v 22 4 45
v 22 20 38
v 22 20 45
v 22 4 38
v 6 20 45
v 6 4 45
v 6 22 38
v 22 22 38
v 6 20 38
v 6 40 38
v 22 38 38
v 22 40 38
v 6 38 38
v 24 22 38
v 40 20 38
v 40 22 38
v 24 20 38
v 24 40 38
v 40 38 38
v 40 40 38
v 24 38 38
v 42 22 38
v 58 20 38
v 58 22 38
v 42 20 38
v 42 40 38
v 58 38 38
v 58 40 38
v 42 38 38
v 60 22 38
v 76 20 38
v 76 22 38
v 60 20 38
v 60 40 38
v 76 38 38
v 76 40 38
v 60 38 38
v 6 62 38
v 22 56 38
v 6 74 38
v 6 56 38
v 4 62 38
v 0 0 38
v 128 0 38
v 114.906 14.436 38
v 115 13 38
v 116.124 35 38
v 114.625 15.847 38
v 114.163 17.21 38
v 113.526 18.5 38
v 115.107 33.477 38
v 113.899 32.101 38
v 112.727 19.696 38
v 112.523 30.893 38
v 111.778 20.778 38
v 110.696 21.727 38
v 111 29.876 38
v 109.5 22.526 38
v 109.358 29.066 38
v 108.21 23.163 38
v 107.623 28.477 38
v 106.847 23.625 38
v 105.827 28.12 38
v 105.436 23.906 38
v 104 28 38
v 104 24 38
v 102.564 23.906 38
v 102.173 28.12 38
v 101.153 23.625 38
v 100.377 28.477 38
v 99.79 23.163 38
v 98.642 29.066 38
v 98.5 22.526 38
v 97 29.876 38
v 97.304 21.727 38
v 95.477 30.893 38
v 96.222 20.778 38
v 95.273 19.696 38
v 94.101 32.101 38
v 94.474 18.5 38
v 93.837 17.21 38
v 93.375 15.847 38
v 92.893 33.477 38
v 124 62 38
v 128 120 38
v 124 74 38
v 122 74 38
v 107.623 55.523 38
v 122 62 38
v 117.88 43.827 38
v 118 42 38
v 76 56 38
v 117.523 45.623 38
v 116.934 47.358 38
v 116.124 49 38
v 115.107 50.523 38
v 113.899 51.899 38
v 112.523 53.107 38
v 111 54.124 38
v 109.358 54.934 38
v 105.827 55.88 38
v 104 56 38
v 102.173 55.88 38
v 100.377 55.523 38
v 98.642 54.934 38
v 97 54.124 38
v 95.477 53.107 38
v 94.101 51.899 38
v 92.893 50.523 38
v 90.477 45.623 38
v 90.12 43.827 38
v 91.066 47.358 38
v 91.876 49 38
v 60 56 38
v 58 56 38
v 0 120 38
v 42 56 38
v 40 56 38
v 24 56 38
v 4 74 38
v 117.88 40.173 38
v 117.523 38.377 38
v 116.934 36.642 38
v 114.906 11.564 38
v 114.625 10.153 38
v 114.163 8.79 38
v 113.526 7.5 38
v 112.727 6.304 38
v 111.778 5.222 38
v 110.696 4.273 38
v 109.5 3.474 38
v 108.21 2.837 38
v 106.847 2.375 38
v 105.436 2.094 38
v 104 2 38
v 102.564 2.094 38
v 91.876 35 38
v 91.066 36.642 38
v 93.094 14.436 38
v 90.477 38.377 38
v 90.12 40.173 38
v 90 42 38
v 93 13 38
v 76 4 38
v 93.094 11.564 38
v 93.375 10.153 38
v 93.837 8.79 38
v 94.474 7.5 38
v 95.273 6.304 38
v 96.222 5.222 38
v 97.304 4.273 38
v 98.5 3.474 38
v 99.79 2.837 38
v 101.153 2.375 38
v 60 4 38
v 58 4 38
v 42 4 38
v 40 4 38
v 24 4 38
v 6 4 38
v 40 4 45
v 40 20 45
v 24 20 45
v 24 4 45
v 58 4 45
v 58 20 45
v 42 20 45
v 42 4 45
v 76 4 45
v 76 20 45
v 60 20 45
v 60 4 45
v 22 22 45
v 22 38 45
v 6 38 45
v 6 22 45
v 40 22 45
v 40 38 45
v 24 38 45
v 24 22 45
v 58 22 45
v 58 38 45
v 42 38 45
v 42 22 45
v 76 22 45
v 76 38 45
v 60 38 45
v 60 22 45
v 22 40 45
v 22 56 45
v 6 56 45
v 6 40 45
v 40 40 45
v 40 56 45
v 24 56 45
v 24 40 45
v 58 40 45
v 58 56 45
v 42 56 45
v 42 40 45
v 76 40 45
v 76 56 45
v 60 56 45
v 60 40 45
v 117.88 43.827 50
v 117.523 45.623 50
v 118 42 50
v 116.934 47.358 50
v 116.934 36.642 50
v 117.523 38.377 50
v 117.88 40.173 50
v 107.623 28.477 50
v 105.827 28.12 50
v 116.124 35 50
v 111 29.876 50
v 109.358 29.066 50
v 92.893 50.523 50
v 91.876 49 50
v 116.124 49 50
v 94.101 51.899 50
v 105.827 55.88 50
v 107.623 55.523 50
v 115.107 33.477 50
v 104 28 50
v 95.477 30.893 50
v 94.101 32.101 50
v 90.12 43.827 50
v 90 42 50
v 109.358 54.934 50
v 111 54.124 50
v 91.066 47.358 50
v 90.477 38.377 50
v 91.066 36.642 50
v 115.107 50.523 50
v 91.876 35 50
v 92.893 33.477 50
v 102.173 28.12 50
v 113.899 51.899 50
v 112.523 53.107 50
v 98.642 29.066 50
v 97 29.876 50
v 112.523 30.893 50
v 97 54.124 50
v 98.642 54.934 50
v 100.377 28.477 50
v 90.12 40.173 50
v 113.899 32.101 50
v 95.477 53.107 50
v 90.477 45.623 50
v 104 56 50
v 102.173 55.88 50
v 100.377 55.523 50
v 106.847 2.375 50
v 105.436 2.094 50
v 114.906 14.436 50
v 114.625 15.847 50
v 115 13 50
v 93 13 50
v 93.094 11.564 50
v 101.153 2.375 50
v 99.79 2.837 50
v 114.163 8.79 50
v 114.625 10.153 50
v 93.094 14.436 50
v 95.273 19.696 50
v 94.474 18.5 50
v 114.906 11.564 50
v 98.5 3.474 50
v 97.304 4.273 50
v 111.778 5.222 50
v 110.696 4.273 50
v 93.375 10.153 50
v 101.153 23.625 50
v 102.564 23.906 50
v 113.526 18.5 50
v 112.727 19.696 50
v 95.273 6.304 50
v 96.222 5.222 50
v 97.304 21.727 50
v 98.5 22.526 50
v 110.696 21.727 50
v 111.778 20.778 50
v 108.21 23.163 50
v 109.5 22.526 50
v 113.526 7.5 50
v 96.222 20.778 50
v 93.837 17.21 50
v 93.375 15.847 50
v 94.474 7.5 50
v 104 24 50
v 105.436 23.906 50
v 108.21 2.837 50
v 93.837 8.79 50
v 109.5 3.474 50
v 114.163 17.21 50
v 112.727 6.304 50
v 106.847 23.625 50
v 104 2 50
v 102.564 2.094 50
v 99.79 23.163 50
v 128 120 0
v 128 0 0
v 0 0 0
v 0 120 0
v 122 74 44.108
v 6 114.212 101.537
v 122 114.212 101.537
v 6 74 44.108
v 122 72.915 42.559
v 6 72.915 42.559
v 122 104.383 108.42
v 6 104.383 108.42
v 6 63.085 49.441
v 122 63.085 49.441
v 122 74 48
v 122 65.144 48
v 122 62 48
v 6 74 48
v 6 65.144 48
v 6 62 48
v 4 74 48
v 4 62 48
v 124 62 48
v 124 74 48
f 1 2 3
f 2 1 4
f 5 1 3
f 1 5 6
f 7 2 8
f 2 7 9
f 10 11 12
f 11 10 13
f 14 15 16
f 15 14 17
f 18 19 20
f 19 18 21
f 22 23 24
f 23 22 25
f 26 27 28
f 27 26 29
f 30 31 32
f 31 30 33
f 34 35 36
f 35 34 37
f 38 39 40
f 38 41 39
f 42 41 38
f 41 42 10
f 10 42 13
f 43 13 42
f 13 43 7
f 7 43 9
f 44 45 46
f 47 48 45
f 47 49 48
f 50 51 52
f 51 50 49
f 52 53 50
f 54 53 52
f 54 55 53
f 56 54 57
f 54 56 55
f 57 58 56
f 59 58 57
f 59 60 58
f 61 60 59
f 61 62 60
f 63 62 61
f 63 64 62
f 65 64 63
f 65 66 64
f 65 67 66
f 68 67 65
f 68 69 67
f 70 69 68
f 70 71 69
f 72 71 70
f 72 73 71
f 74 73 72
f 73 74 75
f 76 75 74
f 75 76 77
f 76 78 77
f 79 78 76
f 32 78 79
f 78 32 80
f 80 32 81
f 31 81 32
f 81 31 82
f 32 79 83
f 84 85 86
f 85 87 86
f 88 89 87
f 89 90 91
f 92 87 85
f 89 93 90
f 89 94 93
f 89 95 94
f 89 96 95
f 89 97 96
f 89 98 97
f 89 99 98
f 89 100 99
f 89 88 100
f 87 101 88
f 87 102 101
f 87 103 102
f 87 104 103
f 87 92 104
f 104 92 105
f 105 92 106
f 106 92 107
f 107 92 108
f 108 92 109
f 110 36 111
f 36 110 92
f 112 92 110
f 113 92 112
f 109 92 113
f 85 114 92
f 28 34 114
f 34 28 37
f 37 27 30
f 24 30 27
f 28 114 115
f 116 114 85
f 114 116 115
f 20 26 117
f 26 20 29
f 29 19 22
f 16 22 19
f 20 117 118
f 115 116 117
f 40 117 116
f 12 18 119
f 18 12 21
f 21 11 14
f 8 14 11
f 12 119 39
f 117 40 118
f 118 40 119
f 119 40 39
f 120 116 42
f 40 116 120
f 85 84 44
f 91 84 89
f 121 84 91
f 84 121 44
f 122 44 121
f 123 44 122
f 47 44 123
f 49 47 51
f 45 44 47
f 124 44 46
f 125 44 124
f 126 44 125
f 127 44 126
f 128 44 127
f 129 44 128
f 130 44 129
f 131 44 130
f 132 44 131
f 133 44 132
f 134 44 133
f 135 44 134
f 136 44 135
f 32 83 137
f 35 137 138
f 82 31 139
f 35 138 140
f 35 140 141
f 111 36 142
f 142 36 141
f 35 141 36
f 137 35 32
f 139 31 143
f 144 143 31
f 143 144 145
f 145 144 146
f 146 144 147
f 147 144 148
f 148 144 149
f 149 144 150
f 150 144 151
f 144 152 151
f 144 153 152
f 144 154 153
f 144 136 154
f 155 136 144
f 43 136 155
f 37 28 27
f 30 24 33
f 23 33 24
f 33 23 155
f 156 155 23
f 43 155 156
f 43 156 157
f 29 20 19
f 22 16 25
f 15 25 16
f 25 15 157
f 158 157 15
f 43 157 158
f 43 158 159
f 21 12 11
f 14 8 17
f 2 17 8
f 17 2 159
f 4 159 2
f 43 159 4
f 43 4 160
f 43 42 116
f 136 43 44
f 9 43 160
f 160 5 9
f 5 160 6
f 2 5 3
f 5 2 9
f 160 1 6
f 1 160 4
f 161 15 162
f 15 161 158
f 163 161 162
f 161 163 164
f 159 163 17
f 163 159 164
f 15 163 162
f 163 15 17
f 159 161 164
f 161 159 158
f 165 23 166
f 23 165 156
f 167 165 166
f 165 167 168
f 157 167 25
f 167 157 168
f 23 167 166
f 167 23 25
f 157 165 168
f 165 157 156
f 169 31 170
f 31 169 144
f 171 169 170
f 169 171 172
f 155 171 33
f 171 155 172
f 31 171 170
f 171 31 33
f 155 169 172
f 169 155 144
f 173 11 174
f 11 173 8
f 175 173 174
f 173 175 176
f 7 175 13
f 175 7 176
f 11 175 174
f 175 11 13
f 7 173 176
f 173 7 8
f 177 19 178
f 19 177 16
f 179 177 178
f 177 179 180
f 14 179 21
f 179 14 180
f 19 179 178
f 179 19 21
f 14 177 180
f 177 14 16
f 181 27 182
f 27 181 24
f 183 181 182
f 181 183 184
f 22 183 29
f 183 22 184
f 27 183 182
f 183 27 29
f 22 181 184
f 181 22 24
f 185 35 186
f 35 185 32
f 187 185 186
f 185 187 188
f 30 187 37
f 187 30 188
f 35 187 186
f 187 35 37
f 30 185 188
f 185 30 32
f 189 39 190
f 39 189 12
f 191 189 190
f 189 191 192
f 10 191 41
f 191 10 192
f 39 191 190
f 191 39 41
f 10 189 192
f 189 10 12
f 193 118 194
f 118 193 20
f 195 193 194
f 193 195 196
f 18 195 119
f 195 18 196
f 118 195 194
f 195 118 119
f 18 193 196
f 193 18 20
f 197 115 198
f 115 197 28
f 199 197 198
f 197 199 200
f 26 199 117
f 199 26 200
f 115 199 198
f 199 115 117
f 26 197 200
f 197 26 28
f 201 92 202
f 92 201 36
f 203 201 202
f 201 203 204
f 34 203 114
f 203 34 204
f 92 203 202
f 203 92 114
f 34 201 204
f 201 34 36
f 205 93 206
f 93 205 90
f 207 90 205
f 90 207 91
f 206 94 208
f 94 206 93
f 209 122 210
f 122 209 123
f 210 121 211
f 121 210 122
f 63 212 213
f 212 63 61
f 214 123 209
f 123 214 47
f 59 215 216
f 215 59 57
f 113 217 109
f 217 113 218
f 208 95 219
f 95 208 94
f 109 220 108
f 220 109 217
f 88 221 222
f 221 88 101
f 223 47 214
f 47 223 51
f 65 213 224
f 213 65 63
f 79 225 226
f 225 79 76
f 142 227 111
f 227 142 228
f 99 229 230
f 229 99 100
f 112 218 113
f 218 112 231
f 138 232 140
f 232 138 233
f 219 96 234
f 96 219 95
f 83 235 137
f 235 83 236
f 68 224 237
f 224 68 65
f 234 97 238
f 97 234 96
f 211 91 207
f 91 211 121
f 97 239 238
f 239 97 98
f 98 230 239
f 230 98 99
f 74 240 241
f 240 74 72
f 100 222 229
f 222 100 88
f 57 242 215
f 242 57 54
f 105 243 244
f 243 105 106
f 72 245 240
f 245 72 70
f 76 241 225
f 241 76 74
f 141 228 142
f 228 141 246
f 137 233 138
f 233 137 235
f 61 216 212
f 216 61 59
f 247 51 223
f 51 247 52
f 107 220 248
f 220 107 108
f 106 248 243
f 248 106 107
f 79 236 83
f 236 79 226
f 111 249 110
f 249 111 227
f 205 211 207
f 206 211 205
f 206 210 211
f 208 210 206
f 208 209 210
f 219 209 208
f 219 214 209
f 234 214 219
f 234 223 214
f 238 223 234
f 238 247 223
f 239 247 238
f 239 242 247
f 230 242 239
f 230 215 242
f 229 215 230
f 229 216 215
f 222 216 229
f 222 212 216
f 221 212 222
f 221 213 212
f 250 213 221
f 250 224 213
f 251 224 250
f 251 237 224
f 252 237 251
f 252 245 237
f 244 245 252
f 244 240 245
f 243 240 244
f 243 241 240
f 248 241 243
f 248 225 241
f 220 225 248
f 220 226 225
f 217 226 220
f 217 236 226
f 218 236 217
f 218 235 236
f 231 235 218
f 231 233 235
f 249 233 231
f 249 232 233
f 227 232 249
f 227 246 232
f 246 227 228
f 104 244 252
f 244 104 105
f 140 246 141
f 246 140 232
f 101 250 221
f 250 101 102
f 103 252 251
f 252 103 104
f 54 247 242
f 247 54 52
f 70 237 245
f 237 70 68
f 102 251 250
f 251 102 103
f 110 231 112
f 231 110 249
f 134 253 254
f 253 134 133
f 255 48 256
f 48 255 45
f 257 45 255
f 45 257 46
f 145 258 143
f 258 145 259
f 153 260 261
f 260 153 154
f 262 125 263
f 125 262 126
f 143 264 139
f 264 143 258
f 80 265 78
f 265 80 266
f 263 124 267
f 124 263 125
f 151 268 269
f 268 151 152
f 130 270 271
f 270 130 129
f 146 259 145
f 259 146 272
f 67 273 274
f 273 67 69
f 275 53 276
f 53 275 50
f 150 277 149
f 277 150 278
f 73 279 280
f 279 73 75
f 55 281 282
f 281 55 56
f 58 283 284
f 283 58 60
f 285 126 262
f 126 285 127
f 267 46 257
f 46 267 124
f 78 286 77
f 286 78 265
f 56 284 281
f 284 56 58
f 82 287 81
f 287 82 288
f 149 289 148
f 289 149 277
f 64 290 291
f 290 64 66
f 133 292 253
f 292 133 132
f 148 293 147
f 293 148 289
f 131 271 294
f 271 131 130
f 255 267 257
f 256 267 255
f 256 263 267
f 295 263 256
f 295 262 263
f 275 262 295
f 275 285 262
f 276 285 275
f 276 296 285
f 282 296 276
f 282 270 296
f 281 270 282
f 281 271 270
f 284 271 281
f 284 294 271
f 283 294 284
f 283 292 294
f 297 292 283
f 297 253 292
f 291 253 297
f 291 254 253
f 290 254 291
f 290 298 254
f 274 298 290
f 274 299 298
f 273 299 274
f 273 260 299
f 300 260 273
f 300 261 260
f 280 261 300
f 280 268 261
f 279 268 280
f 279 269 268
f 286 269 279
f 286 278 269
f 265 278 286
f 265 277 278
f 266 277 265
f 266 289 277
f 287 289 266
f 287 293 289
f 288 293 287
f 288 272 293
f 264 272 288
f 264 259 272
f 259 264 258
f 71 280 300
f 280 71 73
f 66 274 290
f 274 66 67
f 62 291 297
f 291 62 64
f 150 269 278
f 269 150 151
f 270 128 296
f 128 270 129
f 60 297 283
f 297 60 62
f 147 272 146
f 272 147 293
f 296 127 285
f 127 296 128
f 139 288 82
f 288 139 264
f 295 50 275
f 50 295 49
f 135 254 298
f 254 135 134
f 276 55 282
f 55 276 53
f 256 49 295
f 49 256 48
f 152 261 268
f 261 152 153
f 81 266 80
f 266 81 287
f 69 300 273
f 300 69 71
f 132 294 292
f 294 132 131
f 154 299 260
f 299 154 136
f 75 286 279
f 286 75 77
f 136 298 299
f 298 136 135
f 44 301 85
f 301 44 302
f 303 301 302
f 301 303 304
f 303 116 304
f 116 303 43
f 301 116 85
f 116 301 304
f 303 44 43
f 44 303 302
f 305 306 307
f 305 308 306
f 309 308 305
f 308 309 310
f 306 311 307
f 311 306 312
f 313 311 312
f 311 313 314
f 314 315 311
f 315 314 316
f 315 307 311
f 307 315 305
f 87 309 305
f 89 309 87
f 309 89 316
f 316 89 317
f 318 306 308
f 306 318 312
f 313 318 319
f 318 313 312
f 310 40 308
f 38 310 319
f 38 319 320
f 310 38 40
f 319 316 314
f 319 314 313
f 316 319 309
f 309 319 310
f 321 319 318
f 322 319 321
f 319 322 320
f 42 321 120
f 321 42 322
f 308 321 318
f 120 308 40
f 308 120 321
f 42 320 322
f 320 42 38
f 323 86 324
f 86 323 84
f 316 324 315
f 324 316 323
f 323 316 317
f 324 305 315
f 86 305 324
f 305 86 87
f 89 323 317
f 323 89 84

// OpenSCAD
// Generated by build.py. Edit model.py / layouts.py / components.json.
// MM. Concept envelopes; not manufacturing geometry.
layout_index = 1; // [0:Lineal,1:Cuadricula,2:Doble fila]
screen_angle = 55; // [0:1:75]
show_clearances = false;
show_envelope = true;
$fn=48;
module item(s,c,col,shape) {
  color(col) translate(c)
    if(shape=="cylinder") cylinder(d=s[0], h=s[2], center=true);
    else cube(s, center=true);
}
if (layout_index == 0) {
  // Portaceldas + 2×18650
  item([80, 42, 21],[44.0, 96.0, 13.5],[0.84, 0.51, 0.22, 1],"box");
  // LM2596S + voltímetro
  item([66, 36, 16],[58.0, 21.0, 11.0],[0.84, 0.51, 0.22, 1],"box");
  // ESP32-S3
  item([60, 29, 14],[55.0, 56.5, 10.0],[0.15, 0.55, 0.48, 1],"box");
  // BMS 2S USB-C
  item([18, 42, 6],[99.0, 96.0, 6.0],[0.84, 0.51, 0.22, 1],"box");
  // Parlante izquierdo
  item([18, 56, 15],[12.0, 31.0, 10.5],[0.43, 0.38, 0.67, 1],"box");
  // Parlante derecho
  item([18, 56, 15],[108.0, 31.0, 10.5],[0.43, 0.38, 0.67, 1],"box");
  // NeoPixel zona 1 · 4 LEDs
  item([20, 20, 5],[16.0, 90.0, 29.5],[0.15, 0.55, 0.48, 1],"box");
  // NeoPixel zona 2 · 4 LEDs
  item([20, 20, 5],[40.0, 90.0, 29.5],[0.15, 0.55, 0.48, 1],"box");
  // MAX98357A L
  item([20, 16, 6],[64.0, 90.0, 30.0],[0.43, 0.38, 0.67, 1],"box");
  // MAX98357A R
  item([20, 16, 6],[64.0, 108.0, 30.0],[0.43, 0.38, 0.67, 1],"box");
  // Reserva condensador 1
  item([10, 10, 13],[8.0, 67.0, 9.5],[0.84, 0.51, 0.22, 1],"box");
  // Reserva condensador 2
  item([10, 10, 13],[19.0, 67.0, 9.5],[0.84, 0.51, 0.22, 1],"box");
  // SW-CELDAS
  item([12, 8, 12],[80.0, 128.0, 31.0],[0.28, 0.32, 0.37, 1],"box");
  // SW-PANTALLA
  item([12, 8, 12],[94.0, 128.0, 31.0],[0.28, 0.32, 0.37, 1],"box");
  // 1
  item([16, 16, 7],[16, 12, 41.5],[0.28, 0.32, 0.37, 1],"box");
  // Pulsador 1
  item([12, 12, 11],[16, 12, 32.5],[0.28, 0.32, 0.37, 1],"box");
  // Soldadura 1
  if(show_clearances) item([14, 14, 5],[16, 12, 24.5],[0.88, 0.35, 0.24, 0.2],"box");
  // 2
  item([16, 16, 7],[34, 12, 41.5],[0.28, 0.32, 0.37, 1],"box");
  // Pulsador 2
  item([12, 12, 11],[34, 12, 32.5],[0.28, 0.32, 0.37, 1],"box");
  // Soldadura 2
  if(show_clearances) item([14, 14, 5],[34, 12, 24.5],[0.88, 0.35, 0.24, 0.2],"box");
  // 3
  item([16, 16, 7],[52, 12, 41.5],[0.28, 0.32, 0.37, 1],"box");
  // Pulsador 3
  item([12, 12, 11],[52, 12, 32.5],[0.28, 0.32, 0.37, 1],"box");
  // Soldadura 3
  if(show_clearances) item([14, 14, 5],[52, 12, 24.5],[0.88, 0.35, 0.24, 0.2],"box");
  // 4
  item([16, 16, 7],[70, 12, 41.5],[0.28, 0.32, 0.37, 1],"box");
  // Pulsador 4
  item([12, 12, 11],[70, 12, 32.5],[0.28, 0.32, 0.37, 1],"box");
  // Soldadura 4
  if(show_clearances) item([14, 14, 5],[70, 12, 24.5],[0.88, 0.35, 0.24, 0.2],"box");
  // 5
  item([16, 16, 7],[88, 12, 41.5],[0.28, 0.32, 0.37, 1],"box");
  // Pulsador 5
  item([12, 12, 11],[88, 12, 32.5],[0.28, 0.32, 0.37, 1],"box");
  // Soldadura 5
  if(show_clearances) item([14, 14, 5],[88, 12, 24.5],[0.88, 0.35, 0.24, 0.2],"box");
  // 6
  item([16, 16, 7],[16, 32, 41.5],[0.28, 0.32, 0.37, 1],"box");
  // Pulsador 6
  item([12, 12, 11],[16, 32, 32.5],[0.28, 0.32, 0.37, 1],"box");
  // Soldadura 6
  if(show_clearances) item([14, 14, 5],[16, 32, 24.5],[0.88, 0.35, 0.24, 0.2],"box");
  // 7
  item([16, 16, 7],[34, 32, 41.5],[0.28, 0.32, 0.37, 1],"box");
  // Pulsador 7
  item([12, 12, 11],[34, 32, 32.5],[0.28, 0.32, 0.37, 1],"box");
  // Soldadura 7
  if(show_clearances) item([14, 14, 5],[34, 32, 24.5],[0.88, 0.35, 0.24, 0.2],"box");
  // 8
  item([16, 16, 7],[52, 32, 41.5],[0.28, 0.32, 0.37, 1],"box");
  // Pulsador 8
  item([12, 12, 11],[52, 32, 32.5],[0.28, 0.32, 0.37, 1],"box");
  // Soldadura 8
  if(show_clearances) item([14, 14, 5],[52, 32, 24.5],[0.88, 0.35, 0.24, 0.2],"box");
  // 9
  item([16, 16, 7],[70, 32, 41.5],[0.28, 0.32, 0.37, 1],"box");
  // Pulsador 9
  item([12, 12, 11],[70, 32, 32.5],[0.28, 0.32, 0.37, 1],"box");
  // Soldadura 9
  if(show_clearances) item([14, 14, 5],[70, 32, 24.5],[0.88, 0.35, 0.24, 0.2],"box");
  // 10
  item([16, 16, 7],[88, 32, 41.5],[0.28, 0.32, 0.37, 1],"box");
  // Pulsador 10
  item([12, 12, 11],[88, 32, 32.5],[0.28, 0.32, 0.37, 1],"box");
  // Soldadura 10
  if(show_clearances) item([14, 14, 5],[88, 32, 24.5],[0.88, 0.35, 0.24, 0.2],"box");
  // ALT1
  item([16, 16, 7],[16, 56, 41.5],[0.28, 0.32, 0.37, 1],"box");
  // Pulsador ALT1
  item([12, 12, 11],[16, 56, 32.5],[0.28, 0.32, 0.37, 1],"box");
  // Soldadura ALT1
  if(show_clearances) item([14, 14, 5],[16, 56, 24.5],[0.88, 0.35, 0.24, 0.2],"box");
  // ALT2
  item([16, 16, 7],[34, 56, 41.5],[0.28, 0.32, 0.37, 1],"box");
  // Pulsador ALT2
  item([12, 12, 11],[34, 56, 32.5],[0.28, 0.32, 0.37, 1],"box");
  // Soldadura ALT2
  if(show_clearances) item([14, 14, 5],[34, 56, 24.5],[0.88, 0.35, 0.24, 0.2],"box");
  // Joystick
  item([34, 26, 14],[96, 55, 31.0],[0.28, 0.32, 0.37, 1],"box");
  // Joystick
  item([28, 28, 12],[96, 55, 44.0],[0.28, 0.32, 0.37, 1],"cylinder");
  // Cableado joystick
  if(show_clearances) item([34, 26, 4],[96, 55, 22],[0.88, 0.35, 0.24, 0.2],"box");
  // Encoder
  item([26, 19, 14],[58, 56, 31.0],[0.28, 0.32, 0.37, 1],"box");
  // Encoder
  item([22, 22, 12],[58, 56, 44.0],[0.28, 0.32, 0.37, 1],"cylinder");
  // Cableado encoder
  if(show_clearances) item([26, 19, 4],[58, 56, 22],[0.88, 0.35, 0.24, 0.2],"box");
  // Recorrido provisional del pulgar
  if(show_clearances) item([38, 38, 20],[96, 55, 50],[0.88, 0.35, 0.24, 0.2],"box");
  // Volumen de carcasa propuesto
  if(show_envelope) item([120, 134, 38],[60.0, 67.0, 19.0],[0.22, 0.26, 0.3, 0.16],"box");
  // Pantalla 4″ con bisel provisional
  translate([60, 83, 46]) rotate([screen_angle,0,0]) item([116, 72, 12],[0, 36.0, 0],[0.1, 0.14, 0.19, 1],"box");
  // Reserva soporte lateral
  item([2, 12, 14],[1.0, 83, 41],[0.22, 0.26, 0.3, 0.16],"box");
  // Reserva soporte lateral
  item([2, 12, 14],[119.0, 83, 41],[0.22, 0.26, 0.3, 0.16],"box");
  // Bucle flexible de pantalla
  if(show_clearances) item([14, 8, 12],[60, 75, 37],[0.88, 0.35, 0.24, 0.2],"box");
  // Acceso USB ESP32 (orientación a confirmar)
  if(show_clearances) item([49, 10, 8],[109.5, 66, 10],[0.88, 0.35, 0.24, 0.2],"box");
  // Acceso USB-C BMS (orientación a confirmar)
  if(show_clearances) item([12, 31, 8],[99, 132.5, 8],[0.88, 0.35, 0.24, 0.2],"box");
}
if (layout_index == 1) {
  // Portaceldas + 2×18650
  item([80, 42, 21],[44.0, 96.0, 13.5],[0.84, 0.51, 0.22, 1],"box");
  // LM2596S + voltímetro
  item([66, 36, 16],[58.0, 21.0, 11.0],[0.84, 0.51, 0.22, 1],"box");
  // ESP32-S3
  item([60, 29, 14],[55.0, 56.5, 10.0],[0.15, 0.55, 0.48, 1],"box");
  // BMS 2S USB-C
  item([18, 42, 6],[99.0, 96.0, 6.0],[0.84, 0.51, 0.22, 1],"box");
  // Parlante izquierdo
  item([18, 56, 15],[12.0, 31.0, 10.5],[0.43, 0.38, 0.67, 1],"box");
  // Parlante derecho
  item([18, 56, 15],[116.0, 31.0, 10.5],[0.43, 0.38, 0.67, 1],"box");
  // NeoPixel zona 1 · 4 LEDs
  item([20, 20, 5],[16.0, 90.0, 29.5],[0.15, 0.55, 0.48, 1],"box");
  // NeoPixel zona 2 · 4 LEDs
  item([20, 20, 5],[40.0, 90.0, 29.5],[0.15, 0.55, 0.48, 1],"box");
  // MAX98357A L
  item([20, 16, 6],[64.0, 90.0, 30.0],[0.43, 0.38, 0.67, 1],"box");
  // MAX98357A R
  item([20, 16, 6],[64.0, 108.0, 30.0],[0.43, 0.38, 0.67, 1],"box");
  // Reserva condensador 1
  item([10, 10, 13],[8.0, 67.0, 9.5],[0.84, 0.51, 0.22, 1],"box");
  // Reserva condensador 2
  item([10, 10, 13],[19.0, 67.0, 9.5],[0.84, 0.51, 0.22, 1],"box");
  // SW-CELDAS
  item([12, 8, 12],[80.0, 114.0, 31.0],[0.28, 0.32, 0.37, 1],"box");
  // SW-PANTALLA
  item([12, 8, 12],[94.0, 114.0, 31.0],[0.28, 0.32, 0.37, 1],"box");
  // 1
  item([16, 16, 7],[14, 12, 41.5],[0.28, 0.32, 0.37, 1],"box");
  // Pulsador 1
  item([12, 12, 11],[14, 12, 32.5],[0.28, 0.32, 0.37, 1],"box");
  // Soldadura 1
  if(show_clearances) item([14, 14, 5],[14, 12, 24.5],[0.88, 0.35, 0.24, 0.2],"box");
  // 2
  item([16, 16, 7],[32, 12, 41.5],[0.28, 0.32, 0.37, 1],"box");
  // Pulsador 2
  item([12, 12, 11],[32, 12, 32.5],[0.28, 0.32, 0.37, 1],"box");
  // Soldadura 2
  if(show_clearances) item([14, 14, 5],[32, 12, 24.5],[0.88, 0.35, 0.24, 0.2],"box");
  // 3
  item([16, 16, 7],[50, 12, 41.5],[0.28, 0.32, 0.37, 1],"box");
  // Pulsador 3
  item([12, 12, 11],[50, 12, 32.5],[0.28, 0.32, 0.37, 1],"box");
  // Soldadura 3
  if(show_clearances) item([14, 14, 5],[50, 12, 24.5],[0.88, 0.35, 0.24, 0.2],"box");
  // 4
  item([16, 16, 7],[68, 12, 41.5],[0.28, 0.32, 0.37, 1],"box");
  // Pulsador 4
  item([12, 12, 11],[68, 12, 32.5],[0.28, 0.32, 0.37, 1],"box");
  // Soldadura 4
  if(show_clearances) item([14, 14, 5],[68, 12, 24.5],[0.88, 0.35, 0.24, 0.2],"box");
  // 5
  item([16, 16, 7],[14, 30, 41.5],[0.28, 0.32, 0.37, 1],"box");
  // Pulsador 5
  item([12, 12, 11],[14, 30, 32.5],[0.28, 0.32, 0.37, 1],"box");
  // Soldadura 5
  if(show_clearances) item([14, 14, 5],[14, 30, 24.5],[0.88, 0.35, 0.24, 0.2],"box");
  // 6
  item([16, 16, 7],[32, 30, 41.5],[0.28, 0.32, 0.37, 1],"box");
  // Pulsador 6
  item([12, 12, 11],[32, 30, 32.5],[0.28, 0.32, 0.37, 1],"box");
  // Soldadura 6
  if(show_clearances) item([14, 14, 5],[32, 30, 24.5],[0.88, 0.35, 0.24, 0.2],"box");
  // 7
  item([16, 16, 7],[50, 30, 41.5],[0.28, 0.32, 0.37, 1],"box");
  // Pulsador 7
  item([12, 12, 11],[50, 30, 32.5],[0.28, 0.32, 0.37, 1],"box");
  // Soldadura 7
  if(show_clearances) item([14, 14, 5],[50, 30, 24.5],[0.88, 0.35, 0.24, 0.2],"box");
  // 8
  item([16, 16, 7],[68, 30, 41.5],[0.28, 0.32, 0.37, 1],"box");
  // Pulsador 8
  item([12, 12, 11],[68, 30, 32.5],[0.28, 0.32, 0.37, 1],"box");
  // Soldadura 8
  if(show_clearances) item([14, 14, 5],[68, 30, 24.5],[0.88, 0.35, 0.24, 0.2],"box");
  // 9
  item([16, 16, 7],[14, 48, 41.5],[0.28, 0.32, 0.37, 1],"box");
  // Pulsador 9
  item([12, 12, 11],[14, 48, 32.5],[0.28, 0.32, 0.37, 1],"box");
  // Soldadura 9
  if(show_clearances) item([14, 14, 5],[14, 48, 24.5],[0.88, 0.35, 0.24, 0.2],"box");
  // 10
  item([16, 16, 7],[32, 48, 41.5],[0.28, 0.32, 0.37, 1],"box");
  // Pulsador 10
  item([12, 12, 11],[32, 48, 32.5],[0.28, 0.32, 0.37, 1],"box");
  // Soldadura 10
  if(show_clearances) item([14, 14, 5],[32, 48, 24.5],[0.88, 0.35, 0.24, 0.2],"box");
  // ALT1
  item([16, 16, 7],[50, 48, 41.5],[0.28, 0.32, 0.37, 1],"box");
  // Pulsador ALT1
  item([12, 12, 11],[50, 48, 32.5],[0.28, 0.32, 0.37, 1],"box");
  // Soldadura ALT1
  if(show_clearances) item([14, 14, 5],[50, 48, 24.5],[0.88, 0.35, 0.24, 0.2],"box");
  // ALT2
  item([16, 16, 7],[68, 48, 41.5],[0.28, 0.32, 0.37, 1],"box");
  // Pulsador ALT2
  item([12, 12, 11],[68, 48, 32.5],[0.28, 0.32, 0.37, 1],"box");
  // Soldadura ALT2
  if(show_clearances) item([14, 14, 5],[68, 48, 24.5],[0.88, 0.35, 0.24, 0.2],"box");
  // Joystick
  item([34, 26, 14],[104, 42, 31.0],[0.28, 0.32, 0.37, 1],"box");
  // Joystick
  item([28, 28, 12],[104, 42, 44.0],[0.28, 0.32, 0.37, 1],"cylinder");
  // Cableado joystick
  if(show_clearances) item([34, 26, 4],[104, 42, 22],[0.88, 0.35, 0.24, 0.2],"box");
  // Encoder
  item([26, 19, 14],[104, 13, 31.0],[0.28, 0.32, 0.37, 1],"box");
  // Encoder
  item([22, 22, 12],[104, 13, 44.0],[0.28, 0.32, 0.37, 1],"cylinder");
  // Cableado encoder
  if(show_clearances) item([26, 19, 4],[104, 13, 22],[0.88, 0.35, 0.24, 0.2],"box");
  // Recorrido provisional del pulgar
  if(show_clearances) item([38, 38, 20],[104, 42, 50],[0.88, 0.35, 0.24, 0.2],"box");
  // Volumen de carcasa propuesto
  if(show_envelope) item([128, 120, 38],[64.0, 60.0, 19.0],[0.22, 0.26, 0.3, 0.16],"box");
  // Pantalla 4″ con bisel provisional
  translate([64, 68, 46]) rotate([screen_angle,0,0]) item([116, 72, 12],[0, 36.0, 0],[0.1, 0.14, 0.19, 1],"box");
  // Reserva soporte lateral
  item([2, 12, 14],[5.0, 68, 41],[0.22, 0.26, 0.3, 0.16],"box");
  // Reserva soporte lateral
  item([2, 12, 14],[123.0, 68, 41],[0.22, 0.26, 0.3, 0.16],"box");
  // Bucle flexible de pantalla
  if(show_clearances) item([14, 8, 12],[64, 60, 37],[0.88, 0.35, 0.24, 0.2],"box");
  // Acceso USB ESP32 (orientación a confirmar)
  if(show_clearances) item([57, 10, 8],[113.5, 66, 10],[0.88, 0.35, 0.24, 0.2],"box");
  // Acceso USB-C BMS (orientación a confirmar)
  if(show_clearances) item([12, 17, 8],[99, 125.5, 8],[0.88, 0.35, 0.24, 0.2],"box");
}
if (layout_index == 2) {
  // Portaceldas + 2×18650
  item([80, 42, 21],[44.0, 96.0, 13.5],[0.84, 0.51, 0.22, 1],"box");
  // LM2596S + voltímetro
  item([66, 36, 16],[58.0, 21.0, 11.0],[0.84, 0.51, 0.22, 1],"box");
  // ESP32-S3
  item([60, 29, 14],[55.0, 56.5, 10.0],[0.15, 0.55, 0.48, 1],"box");
  // BMS 2S USB-C
  item([18, 42, 6],[99.0, 96.0, 6.0],[0.84, 0.51, 0.22, 1],"box");
  // Parlante izquierdo
  item([18, 56, 15],[12.0, 31.0, 10.5],[0.43, 0.38, 0.67, 1],"box");
  // Parlante derecho
  item([18, 56, 15],[112.0, 31.0, 10.5],[0.43, 0.38, 0.67, 1],"box");
  // NeoPixel zona 1 · 4 LEDs
  item([20, 20, 5],[16.0, 90.0, 29.5],[0.15, 0.55, 0.48, 1],"box");
  // NeoPixel zona 2 · 4 LEDs
  item([20, 20, 5],[40.0, 90.0, 29.5],[0.15, 0.55, 0.48, 1],"box");
  // MAX98357A L
  item([20, 16, 6],[64.0, 90.0, 30.0],[0.43, 0.38, 0.67, 1],"box");
  // MAX98357A R
  item([20, 16, 6],[64.0, 108.0, 30.0],[0.43, 0.38, 0.67, 1],"box");
  // Reserva condensador 1
  item([10, 10, 13],[8.0, 67.0, 9.5],[0.84, 0.51, 0.22, 1],"box");
  // Reserva condensador 2
  item([10, 10, 13],[19.0, 67.0, 9.5],[0.84, 0.51, 0.22, 1],"box");
  // SW-CELDAS
  item([12, 8, 12],[80.0, 120.0, 31.0],[0.28, 0.32, 0.37, 1],"box");
  // SW-PANTALLA
  item([12, 8, 12],[94.0, 120.0, 31.0],[0.28, 0.32, 0.37, 1],"box");
  // 1
  item([16, 16, 7],[17, 12, 41.5],[0.28, 0.32, 0.37, 1],"box");
  // Pulsador 1
  item([12, 12, 11],[17, 12, 32.5],[0.28, 0.32, 0.37, 1],"box");
  // Soldadura 1
  if(show_clearances) item([14, 14, 5],[17, 12, 24.5],[0.88, 0.35, 0.24, 0.2],"box");
  // 2
  item([16, 16, 7],[35, 12, 41.5],[0.28, 0.32, 0.37, 1],"box");
  // Pulsador 2
  item([12, 12, 11],[35, 12, 32.5],[0.28, 0.32, 0.37, 1],"box");
  // Soldadura 2
  if(show_clearances) item([14, 14, 5],[35, 12, 24.5],[0.88, 0.35, 0.24, 0.2],"box");
  // 3
  item([16, 16, 7],[53, 12, 41.5],[0.28, 0.32, 0.37, 1],"box");
  // Pulsador 3
  item([12, 12, 11],[53, 12, 32.5],[0.28, 0.32, 0.37, 1],"box");
  // Soldadura 3
  if(show_clearances) item([14, 14, 5],[53, 12, 24.5],[0.88, 0.35, 0.24, 0.2],"box");
  // 4
  item([16, 16, 7],[71, 12, 41.5],[0.28, 0.32, 0.37, 1],"box");
  // Pulsador 4
  item([12, 12, 11],[71, 12, 32.5],[0.28, 0.32, 0.37, 1],"box");
  // Soldadura 4
  if(show_clearances) item([14, 14, 5],[71, 12, 24.5],[0.88, 0.35, 0.24, 0.2],"box");
  // 5
  item([16, 16, 7],[89, 12, 41.5],[0.28, 0.32, 0.37, 1],"box");
  // Pulsador 5
  item([12, 12, 11],[89, 12, 32.5],[0.28, 0.32, 0.37, 1],"box");
  // Soldadura 5
  if(show_clearances) item([14, 14, 5],[89, 12, 24.5],[0.88, 0.35, 0.24, 0.2],"box");
  // 6
  item([16, 16, 7],[17, 32, 41.5],[0.28, 0.32, 0.37, 1],"box");
  // Pulsador 6
  item([12, 12, 11],[17, 32, 32.5],[0.28, 0.32, 0.37, 1],"box");
  // Soldadura 6
  if(show_clearances) item([14, 14, 5],[17, 32, 24.5],[0.88, 0.35, 0.24, 0.2],"box");
  // 7
  item([16, 16, 7],[35, 32, 41.5],[0.28, 0.32, 0.37, 1],"box");
  // Pulsador 7
  item([12, 12, 11],[35, 32, 32.5],[0.28, 0.32, 0.37, 1],"box");
  // Soldadura 7
  if(show_clearances) item([14, 14, 5],[35, 32, 24.5],[0.88, 0.35, 0.24, 0.2],"box");
  // 8
  item([16, 16, 7],[53, 32, 41.5],[0.28, 0.32, 0.37, 1],"box");
  // Pulsador 8
  item([12, 12, 11],[53, 32, 32.5],[0.28, 0.32, 0.37, 1],"box");
  // Soldadura 8
  if(show_clearances) item([14, 14, 5],[53, 32, 24.5],[0.88, 0.35, 0.24, 0.2],"box");
  // 9
  item([16, 16, 7],[71, 32, 41.5],[0.28, 0.32, 0.37, 1],"box");
  // Pulsador 9
  item([12, 12, 11],[71, 32, 32.5],[0.28, 0.32, 0.37, 1],"box");
  // Soldadura 9
  if(show_clearances) item([14, 14, 5],[71, 32, 24.5],[0.88, 0.35, 0.24, 0.2],"box");
  // 10
  item([16, 16, 7],[89, 32, 41.5],[0.28, 0.32, 0.37, 1],"box");
  // Pulsador 10
  item([12, 12, 11],[89, 32, 32.5],[0.28, 0.32, 0.37, 1],"box");
  // Soldadura 10
  if(show_clearances) item([14, 14, 5],[89, 32, 24.5],[0.88, 0.35, 0.24, 0.2],"box");
  // ALT1
  item([16, 16, 7],[107, 12, 41.5],[0.28, 0.32, 0.37, 1],"box");
  // Pulsador ALT1
  item([12, 12, 11],[107, 12, 32.5],[0.28, 0.32, 0.37, 1],"box");
  // Soldadura ALT1
  if(show_clearances) item([14, 14, 5],[107, 12, 24.5],[0.88, 0.35, 0.24, 0.2],"box");
  // ALT2
  item([16, 16, 7],[107, 32, 41.5],[0.28, 0.32, 0.37, 1],"box");
  // Pulsador ALT2
  item([12, 12, 11],[107, 32, 32.5],[0.28, 0.32, 0.37, 1],"box");
  // Soldadura ALT2
  if(show_clearances) item([14, 14, 5],[107, 32, 24.5],[0.88, 0.35, 0.24, 0.2],"box");
  // Joystick
  item([34, 26, 14],[24, 57, 31.0],[0.28, 0.32, 0.37, 1],"box");
  // Joystick
  item([28, 28, 12],[24, 57, 44.0],[0.28, 0.32, 0.37, 1],"cylinder");
  // Cableado joystick
  if(show_clearances) item([34, 26, 4],[24, 57, 22],[0.88, 0.35, 0.24, 0.2],"box");
  // Encoder
  item([26, 19, 14],[64, 57, 31.0],[0.28, 0.32, 0.37, 1],"box");
  // Encoder
  item([22, 22, 12],[64, 57, 44.0],[0.28, 0.32, 0.37, 1],"cylinder");
  // Cableado encoder
  if(show_clearances) item([26, 19, 4],[64, 57, 22],[0.88, 0.35, 0.24, 0.2],"box");
  // Recorrido provisional del pulgar
  if(show_clearances) item([38, 38, 20],[24, 57, 50],[0.88, 0.35, 0.24, 0.2],"box");
  // Volumen de carcasa propuesto
  if(show_envelope) item([124, 126, 38],[62.0, 63.0, 19.0],[0.22, 0.26, 0.3, 0.16],"box");
  // Pantalla 4″ con bisel provisional
  translate([62, 85, 46]) rotate([screen_angle,0,0]) item([116, 72, 12],[0, 36.0, 0],[0.1, 0.14, 0.19, 1],"box");
  // Reserva soporte lateral
  item([2, 12, 14],[3.0, 85, 41],[0.22, 0.26, 0.3, 0.16],"box");
  // Reserva soporte lateral
  item([2, 12, 14],[121.0, 85, 41],[0.22, 0.26, 0.3, 0.16],"box");
  // Bucle flexible de pantalla
  if(show_clearances) item([14, 8, 12],[62, 77, 37],[0.88, 0.35, 0.24, 0.2],"box");
  // Acceso USB ESP32 (orientación a confirmar)
  if(show_clearances) item([53, 10, 8],[111.5, 66, 10],[0.88, 0.35, 0.24, 0.2],"box");
  // Acceso USB-C BMS (orientación a confirmar)
  if(show_clearances) item([12, 23, 8],[99, 128.5, 8],[0.88, 0.35, 0.24, 0.2],"box");
}
